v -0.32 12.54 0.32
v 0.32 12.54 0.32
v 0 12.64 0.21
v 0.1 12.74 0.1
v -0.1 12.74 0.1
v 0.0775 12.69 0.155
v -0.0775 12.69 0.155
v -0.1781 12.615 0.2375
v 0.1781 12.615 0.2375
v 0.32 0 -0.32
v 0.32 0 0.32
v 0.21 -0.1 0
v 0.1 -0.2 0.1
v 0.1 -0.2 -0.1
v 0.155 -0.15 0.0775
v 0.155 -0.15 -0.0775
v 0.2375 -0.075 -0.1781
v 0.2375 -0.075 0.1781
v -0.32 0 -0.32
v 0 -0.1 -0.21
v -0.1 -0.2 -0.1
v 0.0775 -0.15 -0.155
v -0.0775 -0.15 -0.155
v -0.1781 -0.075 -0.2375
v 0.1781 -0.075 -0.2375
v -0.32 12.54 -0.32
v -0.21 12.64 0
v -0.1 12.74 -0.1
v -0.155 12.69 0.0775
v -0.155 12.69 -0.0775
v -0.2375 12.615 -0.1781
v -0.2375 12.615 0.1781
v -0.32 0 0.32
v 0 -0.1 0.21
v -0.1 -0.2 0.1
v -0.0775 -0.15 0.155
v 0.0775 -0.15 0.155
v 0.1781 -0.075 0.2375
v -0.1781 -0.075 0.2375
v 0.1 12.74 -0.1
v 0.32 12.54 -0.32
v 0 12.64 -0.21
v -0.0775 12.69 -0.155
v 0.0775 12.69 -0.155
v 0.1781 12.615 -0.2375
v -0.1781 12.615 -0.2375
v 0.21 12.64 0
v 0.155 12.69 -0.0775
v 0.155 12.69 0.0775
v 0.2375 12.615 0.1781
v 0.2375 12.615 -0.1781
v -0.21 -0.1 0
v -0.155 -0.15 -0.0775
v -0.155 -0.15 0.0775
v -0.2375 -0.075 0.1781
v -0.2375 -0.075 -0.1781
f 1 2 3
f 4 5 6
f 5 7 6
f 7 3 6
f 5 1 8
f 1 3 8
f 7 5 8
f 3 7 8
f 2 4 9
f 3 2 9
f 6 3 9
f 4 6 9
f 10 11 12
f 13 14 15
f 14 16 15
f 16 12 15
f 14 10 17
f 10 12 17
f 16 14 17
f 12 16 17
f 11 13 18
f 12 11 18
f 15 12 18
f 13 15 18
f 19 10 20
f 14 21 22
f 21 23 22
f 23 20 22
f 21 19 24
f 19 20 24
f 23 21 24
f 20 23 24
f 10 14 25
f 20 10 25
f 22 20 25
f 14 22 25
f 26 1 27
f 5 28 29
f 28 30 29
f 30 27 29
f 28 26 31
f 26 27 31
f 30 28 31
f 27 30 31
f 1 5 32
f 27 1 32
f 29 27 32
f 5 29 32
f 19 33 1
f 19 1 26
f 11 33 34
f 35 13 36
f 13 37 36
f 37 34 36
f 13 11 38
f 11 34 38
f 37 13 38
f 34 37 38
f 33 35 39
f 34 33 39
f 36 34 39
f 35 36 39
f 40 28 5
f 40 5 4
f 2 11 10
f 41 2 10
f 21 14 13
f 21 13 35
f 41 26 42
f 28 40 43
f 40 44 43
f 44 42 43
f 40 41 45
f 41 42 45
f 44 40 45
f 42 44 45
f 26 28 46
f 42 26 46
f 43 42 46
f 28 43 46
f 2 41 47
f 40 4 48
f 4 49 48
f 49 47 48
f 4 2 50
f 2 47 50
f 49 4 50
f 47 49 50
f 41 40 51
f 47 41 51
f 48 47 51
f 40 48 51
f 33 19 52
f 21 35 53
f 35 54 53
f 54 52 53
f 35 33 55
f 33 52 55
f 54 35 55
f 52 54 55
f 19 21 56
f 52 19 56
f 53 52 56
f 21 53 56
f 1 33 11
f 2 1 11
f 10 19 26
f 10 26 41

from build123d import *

# Parameters (mm, degrees)
SKETCH1_W           = 0.64
SKETCH1_H           = 0.64
BOSS_EXTRUDE1_DEPTH = 12.54
SKETCH3_W           = 0.2
SKETCH3_H           = 0.2
SKETCH4_W           = 0.2
SKETCH4_H           = 0.2


with BuildPart() as part:
    # Sketch1 → Boss-Extrude1 (new body)
    with BuildSketch(Plane(origin=(0, 0, 0), x_dir=(1, 0, 0), z_dir=(0, 1, 0))):
        Rectangle(SKETCH1_W, SKETCH1_H)
    extrude(amount=BOSS_EXTRUDE1_DEPTH)

    # Sketch3 → section 0 of loft1
    with BuildSketch(Plane(origin=(0, 12.74, 0), x_dir=(1, 0, 0), z_dir=(0, 1, 0)), mode=Mode.PRIVATE) as loft1_s0:
        Rectangle(SKETCH3_W, SKETCH3_H)
    # loft up to a face of the part (loft1)
    loft([loft1_s0.sketch, part.faces().sort_by_distance((0, 12.54, 0))[0]])

    # Sketch4 → section 0 of loft2
    with BuildSketch(Plane(origin=(0, -0.2, 0), x_dir=(-1, 0, 0), z_dir=(0, -1, 0)), mode=Mode.PRIVATE) as loft2_s0:
        Rectangle(SKETCH4_W, SKETCH4_H)
    # loft up to a face of the part (loft2)
    loft([loft2_s0.sketch, part.faces().sort_by_distance((0, 0, 0))[0]])


solid = part.part
